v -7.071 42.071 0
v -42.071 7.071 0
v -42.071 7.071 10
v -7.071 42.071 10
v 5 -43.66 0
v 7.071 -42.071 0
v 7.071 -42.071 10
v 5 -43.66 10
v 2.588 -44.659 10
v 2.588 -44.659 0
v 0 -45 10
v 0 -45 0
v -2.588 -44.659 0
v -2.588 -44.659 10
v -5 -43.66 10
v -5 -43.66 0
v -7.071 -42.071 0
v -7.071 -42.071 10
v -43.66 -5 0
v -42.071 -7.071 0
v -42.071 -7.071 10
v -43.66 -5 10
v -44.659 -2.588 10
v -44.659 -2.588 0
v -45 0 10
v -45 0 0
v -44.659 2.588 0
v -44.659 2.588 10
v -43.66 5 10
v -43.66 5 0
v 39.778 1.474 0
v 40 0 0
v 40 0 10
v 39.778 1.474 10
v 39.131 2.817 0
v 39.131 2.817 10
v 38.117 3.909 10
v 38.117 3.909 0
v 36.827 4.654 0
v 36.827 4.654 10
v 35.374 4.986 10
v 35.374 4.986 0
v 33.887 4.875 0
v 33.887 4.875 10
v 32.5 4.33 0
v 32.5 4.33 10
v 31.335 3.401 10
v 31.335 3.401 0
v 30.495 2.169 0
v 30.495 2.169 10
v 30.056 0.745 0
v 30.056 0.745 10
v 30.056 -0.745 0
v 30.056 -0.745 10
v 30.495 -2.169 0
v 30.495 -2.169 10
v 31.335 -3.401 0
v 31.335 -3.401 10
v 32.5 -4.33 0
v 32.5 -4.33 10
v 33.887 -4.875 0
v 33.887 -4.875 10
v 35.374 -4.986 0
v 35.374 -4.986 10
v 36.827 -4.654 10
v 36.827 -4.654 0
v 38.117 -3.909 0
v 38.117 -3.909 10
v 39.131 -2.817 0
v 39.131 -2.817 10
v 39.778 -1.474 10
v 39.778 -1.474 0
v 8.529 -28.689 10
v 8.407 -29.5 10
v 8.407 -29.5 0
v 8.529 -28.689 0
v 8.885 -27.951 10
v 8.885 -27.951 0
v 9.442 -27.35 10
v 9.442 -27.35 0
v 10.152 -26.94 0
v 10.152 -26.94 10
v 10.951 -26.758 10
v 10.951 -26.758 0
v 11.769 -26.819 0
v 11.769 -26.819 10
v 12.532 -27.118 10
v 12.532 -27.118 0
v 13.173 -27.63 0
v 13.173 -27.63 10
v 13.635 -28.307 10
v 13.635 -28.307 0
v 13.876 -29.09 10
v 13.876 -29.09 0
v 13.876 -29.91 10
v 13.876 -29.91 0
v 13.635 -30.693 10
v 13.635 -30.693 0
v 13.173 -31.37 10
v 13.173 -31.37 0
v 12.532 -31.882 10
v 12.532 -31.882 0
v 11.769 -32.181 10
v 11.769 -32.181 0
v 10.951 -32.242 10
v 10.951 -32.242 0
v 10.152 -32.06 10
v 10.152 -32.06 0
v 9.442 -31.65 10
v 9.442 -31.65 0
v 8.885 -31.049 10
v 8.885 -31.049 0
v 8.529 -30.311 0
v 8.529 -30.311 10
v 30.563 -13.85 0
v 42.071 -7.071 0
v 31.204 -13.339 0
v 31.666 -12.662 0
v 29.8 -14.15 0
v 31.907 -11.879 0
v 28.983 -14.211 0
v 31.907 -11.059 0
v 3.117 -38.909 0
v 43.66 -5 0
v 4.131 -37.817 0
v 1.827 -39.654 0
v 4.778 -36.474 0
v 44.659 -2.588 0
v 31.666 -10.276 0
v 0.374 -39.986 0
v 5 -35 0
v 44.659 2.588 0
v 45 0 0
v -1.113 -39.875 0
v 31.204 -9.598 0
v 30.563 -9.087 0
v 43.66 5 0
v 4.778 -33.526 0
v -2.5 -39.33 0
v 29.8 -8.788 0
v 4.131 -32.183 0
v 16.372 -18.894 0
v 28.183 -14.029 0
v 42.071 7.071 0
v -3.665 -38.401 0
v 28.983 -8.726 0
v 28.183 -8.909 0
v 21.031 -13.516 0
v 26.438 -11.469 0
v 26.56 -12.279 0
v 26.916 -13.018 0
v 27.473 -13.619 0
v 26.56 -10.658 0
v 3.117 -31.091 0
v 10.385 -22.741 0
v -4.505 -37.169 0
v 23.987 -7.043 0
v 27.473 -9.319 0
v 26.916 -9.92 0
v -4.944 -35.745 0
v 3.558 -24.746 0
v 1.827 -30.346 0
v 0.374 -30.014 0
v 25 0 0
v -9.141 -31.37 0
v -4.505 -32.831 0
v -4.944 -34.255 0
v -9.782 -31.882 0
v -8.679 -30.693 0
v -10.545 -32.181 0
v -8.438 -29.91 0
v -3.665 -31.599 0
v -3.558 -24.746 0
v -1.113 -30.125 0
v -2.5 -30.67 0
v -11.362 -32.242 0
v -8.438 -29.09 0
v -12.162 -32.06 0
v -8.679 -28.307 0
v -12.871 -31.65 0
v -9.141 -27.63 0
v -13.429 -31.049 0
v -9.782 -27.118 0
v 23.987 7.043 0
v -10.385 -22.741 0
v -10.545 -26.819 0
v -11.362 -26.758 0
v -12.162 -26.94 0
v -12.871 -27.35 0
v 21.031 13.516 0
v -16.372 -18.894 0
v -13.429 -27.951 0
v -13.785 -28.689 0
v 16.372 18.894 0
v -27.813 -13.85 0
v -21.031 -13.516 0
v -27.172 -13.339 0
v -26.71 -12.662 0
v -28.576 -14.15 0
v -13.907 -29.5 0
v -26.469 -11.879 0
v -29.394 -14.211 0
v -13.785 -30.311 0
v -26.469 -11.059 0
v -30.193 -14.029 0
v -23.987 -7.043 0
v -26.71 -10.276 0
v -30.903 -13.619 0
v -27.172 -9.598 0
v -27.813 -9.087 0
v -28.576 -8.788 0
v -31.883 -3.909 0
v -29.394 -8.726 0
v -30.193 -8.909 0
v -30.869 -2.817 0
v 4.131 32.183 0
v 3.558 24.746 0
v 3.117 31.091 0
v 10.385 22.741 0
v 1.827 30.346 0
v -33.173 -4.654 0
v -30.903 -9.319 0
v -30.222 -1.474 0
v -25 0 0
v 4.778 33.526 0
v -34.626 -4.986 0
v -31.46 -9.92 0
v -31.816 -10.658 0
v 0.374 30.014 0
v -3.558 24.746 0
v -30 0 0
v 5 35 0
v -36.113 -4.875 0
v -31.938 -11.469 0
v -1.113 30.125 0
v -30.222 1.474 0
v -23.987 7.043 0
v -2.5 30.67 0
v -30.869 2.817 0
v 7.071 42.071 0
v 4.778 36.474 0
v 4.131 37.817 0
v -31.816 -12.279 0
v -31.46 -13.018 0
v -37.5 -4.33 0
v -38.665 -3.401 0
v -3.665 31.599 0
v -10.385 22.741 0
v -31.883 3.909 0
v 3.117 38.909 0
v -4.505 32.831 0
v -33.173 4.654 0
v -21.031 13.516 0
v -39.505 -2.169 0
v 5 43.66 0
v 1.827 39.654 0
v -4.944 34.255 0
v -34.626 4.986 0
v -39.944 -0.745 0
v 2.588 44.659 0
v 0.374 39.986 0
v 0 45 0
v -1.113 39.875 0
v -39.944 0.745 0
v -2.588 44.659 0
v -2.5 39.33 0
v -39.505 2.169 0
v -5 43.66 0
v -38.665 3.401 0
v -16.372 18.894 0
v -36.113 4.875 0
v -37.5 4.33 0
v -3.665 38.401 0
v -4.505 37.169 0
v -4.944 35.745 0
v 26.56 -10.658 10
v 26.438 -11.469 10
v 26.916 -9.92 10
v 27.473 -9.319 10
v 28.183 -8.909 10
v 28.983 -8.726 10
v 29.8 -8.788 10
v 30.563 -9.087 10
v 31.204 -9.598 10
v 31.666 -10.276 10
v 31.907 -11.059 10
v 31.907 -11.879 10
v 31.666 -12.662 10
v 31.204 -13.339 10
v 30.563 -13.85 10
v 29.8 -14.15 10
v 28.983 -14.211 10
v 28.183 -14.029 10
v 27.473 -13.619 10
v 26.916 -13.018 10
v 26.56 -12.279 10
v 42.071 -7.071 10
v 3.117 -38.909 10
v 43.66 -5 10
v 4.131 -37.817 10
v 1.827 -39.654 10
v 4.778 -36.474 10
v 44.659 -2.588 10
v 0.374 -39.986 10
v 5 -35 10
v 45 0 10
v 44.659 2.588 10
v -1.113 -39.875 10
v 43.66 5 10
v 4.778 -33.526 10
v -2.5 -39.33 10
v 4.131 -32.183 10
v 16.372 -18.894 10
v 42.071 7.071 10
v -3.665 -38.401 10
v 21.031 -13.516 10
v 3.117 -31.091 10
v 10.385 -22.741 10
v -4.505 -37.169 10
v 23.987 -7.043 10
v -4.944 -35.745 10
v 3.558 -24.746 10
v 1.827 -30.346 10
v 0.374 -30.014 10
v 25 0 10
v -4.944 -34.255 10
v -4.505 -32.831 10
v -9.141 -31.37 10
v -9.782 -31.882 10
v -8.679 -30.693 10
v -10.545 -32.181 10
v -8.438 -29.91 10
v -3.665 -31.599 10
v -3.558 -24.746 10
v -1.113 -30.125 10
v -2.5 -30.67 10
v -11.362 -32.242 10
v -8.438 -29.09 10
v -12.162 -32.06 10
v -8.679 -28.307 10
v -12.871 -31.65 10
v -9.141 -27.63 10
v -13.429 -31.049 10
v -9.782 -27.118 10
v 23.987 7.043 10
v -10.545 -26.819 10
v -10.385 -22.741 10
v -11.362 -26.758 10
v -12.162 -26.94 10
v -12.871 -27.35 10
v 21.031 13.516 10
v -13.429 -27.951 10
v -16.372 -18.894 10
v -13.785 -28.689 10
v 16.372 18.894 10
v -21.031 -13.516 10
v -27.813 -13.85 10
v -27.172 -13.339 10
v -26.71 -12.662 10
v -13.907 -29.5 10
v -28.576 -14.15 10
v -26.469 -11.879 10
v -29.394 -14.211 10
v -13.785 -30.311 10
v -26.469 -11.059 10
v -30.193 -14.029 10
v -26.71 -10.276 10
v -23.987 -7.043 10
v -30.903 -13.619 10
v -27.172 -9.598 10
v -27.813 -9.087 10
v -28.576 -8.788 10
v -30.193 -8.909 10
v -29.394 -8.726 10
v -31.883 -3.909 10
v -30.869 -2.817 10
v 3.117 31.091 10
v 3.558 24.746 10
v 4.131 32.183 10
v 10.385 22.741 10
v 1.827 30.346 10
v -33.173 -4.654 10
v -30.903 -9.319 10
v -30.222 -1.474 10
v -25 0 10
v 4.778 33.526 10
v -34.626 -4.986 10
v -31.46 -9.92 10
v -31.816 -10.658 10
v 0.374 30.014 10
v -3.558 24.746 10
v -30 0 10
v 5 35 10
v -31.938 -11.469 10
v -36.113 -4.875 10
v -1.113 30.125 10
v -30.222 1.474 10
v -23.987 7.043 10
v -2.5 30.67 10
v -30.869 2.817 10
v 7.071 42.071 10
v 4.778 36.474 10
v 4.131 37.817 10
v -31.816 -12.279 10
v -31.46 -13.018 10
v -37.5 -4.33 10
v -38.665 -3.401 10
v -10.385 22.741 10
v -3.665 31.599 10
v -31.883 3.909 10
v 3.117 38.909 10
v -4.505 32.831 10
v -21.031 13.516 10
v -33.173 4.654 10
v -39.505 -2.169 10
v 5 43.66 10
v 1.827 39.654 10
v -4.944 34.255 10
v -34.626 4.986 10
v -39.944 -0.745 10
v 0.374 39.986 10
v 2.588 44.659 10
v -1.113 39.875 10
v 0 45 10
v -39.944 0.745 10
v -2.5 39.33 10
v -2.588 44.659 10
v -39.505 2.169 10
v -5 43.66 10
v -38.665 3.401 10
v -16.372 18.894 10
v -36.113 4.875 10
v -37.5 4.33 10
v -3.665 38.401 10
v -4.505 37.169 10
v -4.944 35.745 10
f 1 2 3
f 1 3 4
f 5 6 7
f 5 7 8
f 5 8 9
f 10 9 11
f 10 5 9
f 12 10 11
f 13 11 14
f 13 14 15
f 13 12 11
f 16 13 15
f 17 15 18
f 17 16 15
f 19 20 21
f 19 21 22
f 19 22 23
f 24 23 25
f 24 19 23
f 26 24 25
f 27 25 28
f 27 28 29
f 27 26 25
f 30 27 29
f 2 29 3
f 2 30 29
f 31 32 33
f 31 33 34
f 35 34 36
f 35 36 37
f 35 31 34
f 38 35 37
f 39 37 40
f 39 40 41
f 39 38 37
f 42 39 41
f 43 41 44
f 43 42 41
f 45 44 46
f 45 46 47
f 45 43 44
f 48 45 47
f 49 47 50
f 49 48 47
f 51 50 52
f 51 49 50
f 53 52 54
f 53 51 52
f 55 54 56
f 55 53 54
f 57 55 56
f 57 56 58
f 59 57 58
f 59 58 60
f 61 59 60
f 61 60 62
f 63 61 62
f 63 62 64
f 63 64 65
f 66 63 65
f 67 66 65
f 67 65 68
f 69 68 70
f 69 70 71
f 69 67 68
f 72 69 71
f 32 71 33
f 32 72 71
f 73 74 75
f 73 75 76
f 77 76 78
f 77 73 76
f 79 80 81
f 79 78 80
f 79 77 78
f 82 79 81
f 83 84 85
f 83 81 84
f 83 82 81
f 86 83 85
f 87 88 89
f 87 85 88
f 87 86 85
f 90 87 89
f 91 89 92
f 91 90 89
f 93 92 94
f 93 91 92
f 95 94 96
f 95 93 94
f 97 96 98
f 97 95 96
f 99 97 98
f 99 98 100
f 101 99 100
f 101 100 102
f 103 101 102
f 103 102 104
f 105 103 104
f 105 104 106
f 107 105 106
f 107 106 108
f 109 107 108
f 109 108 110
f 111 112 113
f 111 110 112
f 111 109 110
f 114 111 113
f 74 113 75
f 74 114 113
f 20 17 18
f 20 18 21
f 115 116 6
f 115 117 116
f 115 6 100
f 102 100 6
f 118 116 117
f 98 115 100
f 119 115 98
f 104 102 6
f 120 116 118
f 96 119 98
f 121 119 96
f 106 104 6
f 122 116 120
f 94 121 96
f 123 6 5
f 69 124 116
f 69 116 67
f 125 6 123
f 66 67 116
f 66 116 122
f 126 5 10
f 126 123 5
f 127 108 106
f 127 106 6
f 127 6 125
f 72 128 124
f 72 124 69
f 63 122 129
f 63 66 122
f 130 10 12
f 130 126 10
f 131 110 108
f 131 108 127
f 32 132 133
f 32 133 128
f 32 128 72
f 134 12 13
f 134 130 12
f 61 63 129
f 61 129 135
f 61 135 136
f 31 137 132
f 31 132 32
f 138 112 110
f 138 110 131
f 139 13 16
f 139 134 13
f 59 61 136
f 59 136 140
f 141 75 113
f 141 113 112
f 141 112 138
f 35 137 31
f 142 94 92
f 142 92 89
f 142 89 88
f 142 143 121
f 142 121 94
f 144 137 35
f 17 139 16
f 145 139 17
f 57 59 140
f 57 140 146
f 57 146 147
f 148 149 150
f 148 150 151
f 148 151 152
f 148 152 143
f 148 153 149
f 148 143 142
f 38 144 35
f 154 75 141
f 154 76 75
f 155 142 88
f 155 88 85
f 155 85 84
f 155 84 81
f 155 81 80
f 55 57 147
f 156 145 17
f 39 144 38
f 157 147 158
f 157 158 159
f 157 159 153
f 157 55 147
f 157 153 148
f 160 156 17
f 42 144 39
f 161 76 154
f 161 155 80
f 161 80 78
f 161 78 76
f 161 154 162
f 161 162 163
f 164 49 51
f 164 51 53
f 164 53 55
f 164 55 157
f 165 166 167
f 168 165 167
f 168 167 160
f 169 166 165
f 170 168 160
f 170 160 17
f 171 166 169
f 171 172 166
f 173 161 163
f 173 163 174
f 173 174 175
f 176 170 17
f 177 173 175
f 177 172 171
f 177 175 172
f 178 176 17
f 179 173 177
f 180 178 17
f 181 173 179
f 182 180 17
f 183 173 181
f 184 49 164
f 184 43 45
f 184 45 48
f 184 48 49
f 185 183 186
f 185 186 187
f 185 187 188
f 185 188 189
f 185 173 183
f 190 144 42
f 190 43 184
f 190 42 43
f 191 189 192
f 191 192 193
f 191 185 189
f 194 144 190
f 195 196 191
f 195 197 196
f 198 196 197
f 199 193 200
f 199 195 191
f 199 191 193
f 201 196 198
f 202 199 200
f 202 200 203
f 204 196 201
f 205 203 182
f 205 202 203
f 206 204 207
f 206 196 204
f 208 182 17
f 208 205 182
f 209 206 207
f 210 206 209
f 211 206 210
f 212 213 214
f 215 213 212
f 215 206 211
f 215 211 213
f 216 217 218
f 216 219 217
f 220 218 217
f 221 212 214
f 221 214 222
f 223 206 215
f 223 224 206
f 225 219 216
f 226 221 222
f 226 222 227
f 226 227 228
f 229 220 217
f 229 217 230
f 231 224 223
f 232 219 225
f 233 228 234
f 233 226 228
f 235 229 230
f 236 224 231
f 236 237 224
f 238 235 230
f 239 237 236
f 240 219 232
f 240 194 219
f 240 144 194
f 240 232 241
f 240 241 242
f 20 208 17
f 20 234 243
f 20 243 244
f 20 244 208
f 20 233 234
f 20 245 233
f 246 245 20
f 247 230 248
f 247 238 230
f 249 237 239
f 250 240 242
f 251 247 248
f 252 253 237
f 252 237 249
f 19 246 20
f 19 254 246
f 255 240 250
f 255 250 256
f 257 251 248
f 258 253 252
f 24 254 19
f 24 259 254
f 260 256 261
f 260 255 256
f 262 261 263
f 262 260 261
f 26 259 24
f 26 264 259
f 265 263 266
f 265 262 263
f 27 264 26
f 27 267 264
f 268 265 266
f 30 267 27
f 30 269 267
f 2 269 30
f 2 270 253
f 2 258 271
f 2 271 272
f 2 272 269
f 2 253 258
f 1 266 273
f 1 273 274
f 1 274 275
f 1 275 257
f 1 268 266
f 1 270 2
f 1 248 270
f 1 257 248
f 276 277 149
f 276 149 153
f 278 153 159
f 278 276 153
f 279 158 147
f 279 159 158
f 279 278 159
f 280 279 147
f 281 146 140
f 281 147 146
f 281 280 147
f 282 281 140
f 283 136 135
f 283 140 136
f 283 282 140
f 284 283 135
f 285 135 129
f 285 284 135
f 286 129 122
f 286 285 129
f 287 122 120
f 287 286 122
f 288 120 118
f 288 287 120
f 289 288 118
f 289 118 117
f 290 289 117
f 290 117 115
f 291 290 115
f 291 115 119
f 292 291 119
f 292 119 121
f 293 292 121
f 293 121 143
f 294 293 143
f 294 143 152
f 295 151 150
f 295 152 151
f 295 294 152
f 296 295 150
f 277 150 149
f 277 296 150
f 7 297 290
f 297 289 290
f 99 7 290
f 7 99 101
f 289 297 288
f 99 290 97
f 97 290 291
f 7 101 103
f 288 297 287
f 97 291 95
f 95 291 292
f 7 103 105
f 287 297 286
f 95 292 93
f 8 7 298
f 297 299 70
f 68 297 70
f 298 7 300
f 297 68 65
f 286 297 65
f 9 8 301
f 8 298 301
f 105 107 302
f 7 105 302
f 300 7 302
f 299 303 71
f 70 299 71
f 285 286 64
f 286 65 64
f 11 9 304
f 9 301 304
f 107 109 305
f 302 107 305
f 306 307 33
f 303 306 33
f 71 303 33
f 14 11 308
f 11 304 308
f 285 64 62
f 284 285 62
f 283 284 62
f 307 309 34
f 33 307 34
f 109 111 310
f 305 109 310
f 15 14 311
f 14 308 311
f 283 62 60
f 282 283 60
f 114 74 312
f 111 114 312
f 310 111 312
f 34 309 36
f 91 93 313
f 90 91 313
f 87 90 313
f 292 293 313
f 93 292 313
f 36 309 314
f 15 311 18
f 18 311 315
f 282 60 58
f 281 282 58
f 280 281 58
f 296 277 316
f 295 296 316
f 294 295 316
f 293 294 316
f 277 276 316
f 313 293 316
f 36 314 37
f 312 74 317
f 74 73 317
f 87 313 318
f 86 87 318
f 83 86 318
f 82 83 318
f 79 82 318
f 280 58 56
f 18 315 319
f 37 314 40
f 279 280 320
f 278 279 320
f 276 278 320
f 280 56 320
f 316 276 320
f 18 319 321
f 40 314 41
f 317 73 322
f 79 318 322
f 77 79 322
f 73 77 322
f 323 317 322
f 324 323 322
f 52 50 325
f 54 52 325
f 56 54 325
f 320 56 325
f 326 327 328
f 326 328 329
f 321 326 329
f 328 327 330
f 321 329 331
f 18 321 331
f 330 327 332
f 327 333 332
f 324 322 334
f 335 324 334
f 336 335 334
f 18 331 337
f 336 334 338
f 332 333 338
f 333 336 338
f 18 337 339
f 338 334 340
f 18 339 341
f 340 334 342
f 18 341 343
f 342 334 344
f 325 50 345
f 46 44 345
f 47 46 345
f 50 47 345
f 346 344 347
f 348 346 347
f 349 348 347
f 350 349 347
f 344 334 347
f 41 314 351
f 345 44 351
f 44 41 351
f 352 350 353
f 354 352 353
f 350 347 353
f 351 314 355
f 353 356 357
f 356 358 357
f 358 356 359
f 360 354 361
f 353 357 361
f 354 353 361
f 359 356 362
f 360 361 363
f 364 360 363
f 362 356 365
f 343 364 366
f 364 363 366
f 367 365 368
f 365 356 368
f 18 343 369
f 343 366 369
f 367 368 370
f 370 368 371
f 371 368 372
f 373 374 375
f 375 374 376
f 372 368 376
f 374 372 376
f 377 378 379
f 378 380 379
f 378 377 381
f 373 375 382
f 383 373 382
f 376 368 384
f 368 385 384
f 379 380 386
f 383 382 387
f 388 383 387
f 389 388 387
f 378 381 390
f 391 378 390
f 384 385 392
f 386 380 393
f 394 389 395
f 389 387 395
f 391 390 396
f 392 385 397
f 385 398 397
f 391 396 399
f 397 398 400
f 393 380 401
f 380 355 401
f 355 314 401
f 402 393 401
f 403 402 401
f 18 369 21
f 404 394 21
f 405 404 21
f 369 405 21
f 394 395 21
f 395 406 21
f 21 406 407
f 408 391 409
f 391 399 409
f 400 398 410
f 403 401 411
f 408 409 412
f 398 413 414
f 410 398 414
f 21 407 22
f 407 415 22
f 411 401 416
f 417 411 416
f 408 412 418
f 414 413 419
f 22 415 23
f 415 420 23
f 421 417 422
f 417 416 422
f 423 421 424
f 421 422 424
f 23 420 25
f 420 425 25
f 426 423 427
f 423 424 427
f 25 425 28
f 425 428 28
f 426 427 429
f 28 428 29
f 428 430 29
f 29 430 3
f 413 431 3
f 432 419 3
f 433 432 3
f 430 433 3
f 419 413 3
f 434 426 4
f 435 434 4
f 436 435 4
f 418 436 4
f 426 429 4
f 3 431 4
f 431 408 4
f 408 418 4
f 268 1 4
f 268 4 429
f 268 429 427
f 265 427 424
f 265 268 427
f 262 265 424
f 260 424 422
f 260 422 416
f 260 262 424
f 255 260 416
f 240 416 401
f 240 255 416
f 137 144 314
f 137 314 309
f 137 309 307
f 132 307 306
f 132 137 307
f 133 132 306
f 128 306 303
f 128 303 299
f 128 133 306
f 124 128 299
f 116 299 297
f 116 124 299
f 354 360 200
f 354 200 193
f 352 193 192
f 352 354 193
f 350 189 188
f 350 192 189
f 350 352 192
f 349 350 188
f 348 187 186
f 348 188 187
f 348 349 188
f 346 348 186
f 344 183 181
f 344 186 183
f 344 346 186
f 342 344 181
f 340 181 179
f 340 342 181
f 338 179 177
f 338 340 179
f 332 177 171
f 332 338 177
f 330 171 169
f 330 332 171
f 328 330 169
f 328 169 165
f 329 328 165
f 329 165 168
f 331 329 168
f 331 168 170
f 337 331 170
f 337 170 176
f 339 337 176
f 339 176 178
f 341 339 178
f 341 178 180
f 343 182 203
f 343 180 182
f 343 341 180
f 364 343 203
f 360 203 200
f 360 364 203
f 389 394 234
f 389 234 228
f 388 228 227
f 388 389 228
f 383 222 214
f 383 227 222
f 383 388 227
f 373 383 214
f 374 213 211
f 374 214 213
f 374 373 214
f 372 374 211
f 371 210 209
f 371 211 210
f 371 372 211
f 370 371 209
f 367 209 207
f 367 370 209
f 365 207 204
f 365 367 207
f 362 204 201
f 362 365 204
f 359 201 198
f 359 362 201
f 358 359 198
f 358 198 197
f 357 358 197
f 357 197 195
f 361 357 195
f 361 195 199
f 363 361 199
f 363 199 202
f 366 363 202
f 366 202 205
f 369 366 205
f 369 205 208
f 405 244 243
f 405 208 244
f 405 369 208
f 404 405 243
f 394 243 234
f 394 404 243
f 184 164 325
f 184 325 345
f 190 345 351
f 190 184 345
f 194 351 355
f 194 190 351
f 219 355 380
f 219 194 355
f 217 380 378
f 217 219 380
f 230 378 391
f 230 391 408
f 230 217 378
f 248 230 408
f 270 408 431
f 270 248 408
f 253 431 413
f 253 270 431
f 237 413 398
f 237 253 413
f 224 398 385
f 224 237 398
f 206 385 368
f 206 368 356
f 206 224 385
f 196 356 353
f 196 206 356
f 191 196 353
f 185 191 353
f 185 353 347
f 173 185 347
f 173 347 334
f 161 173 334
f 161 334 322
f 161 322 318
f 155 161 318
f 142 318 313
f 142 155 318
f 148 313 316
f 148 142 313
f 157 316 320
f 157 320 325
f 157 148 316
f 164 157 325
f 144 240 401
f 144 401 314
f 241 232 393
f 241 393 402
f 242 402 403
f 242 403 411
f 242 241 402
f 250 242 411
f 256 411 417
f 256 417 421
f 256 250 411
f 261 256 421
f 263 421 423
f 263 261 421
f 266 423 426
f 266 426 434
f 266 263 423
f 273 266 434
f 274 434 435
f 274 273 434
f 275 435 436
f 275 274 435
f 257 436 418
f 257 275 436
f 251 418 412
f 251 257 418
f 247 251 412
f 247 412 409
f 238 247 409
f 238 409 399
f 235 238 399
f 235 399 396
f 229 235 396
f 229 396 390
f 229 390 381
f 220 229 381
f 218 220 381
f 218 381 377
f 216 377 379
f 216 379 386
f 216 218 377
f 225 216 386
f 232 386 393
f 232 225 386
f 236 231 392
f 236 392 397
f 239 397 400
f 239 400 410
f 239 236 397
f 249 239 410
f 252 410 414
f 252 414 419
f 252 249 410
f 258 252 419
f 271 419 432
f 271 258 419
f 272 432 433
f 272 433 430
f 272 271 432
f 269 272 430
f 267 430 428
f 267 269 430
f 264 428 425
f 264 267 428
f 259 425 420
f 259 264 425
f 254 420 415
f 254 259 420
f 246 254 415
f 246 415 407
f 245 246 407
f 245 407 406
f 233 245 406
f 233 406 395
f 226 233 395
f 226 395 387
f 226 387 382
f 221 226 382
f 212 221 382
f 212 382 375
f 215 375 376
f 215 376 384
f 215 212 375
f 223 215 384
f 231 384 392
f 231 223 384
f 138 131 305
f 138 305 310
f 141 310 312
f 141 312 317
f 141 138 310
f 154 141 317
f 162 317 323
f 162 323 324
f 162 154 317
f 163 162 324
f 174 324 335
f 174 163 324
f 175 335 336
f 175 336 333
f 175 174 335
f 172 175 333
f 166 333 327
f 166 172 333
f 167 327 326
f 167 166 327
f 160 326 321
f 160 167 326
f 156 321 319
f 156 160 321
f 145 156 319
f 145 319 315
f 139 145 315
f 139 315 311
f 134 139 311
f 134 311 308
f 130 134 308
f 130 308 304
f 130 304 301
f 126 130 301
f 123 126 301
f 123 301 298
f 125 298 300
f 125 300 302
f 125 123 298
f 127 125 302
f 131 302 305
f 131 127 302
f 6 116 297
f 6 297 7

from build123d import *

# Parameters (mm, degrees)
SZKIC1_R                        = 5
SZKIC1_R_2                      = 25
DODANIE_WYCI_GNI_CIE1_DEPTH     = 10
WYTNIJ_WYCI_GNI_CIE1_DEPTH      = 65.420493634
WYTNIJ_WYCI_GNI_CIE1_DEPTH_BACK = 65.420493634
SZKIC2_R                        = 2.75


with BuildPart() as part:
    # Szkic1 → Dodanie-wyciągnięcie1 (new body)
    with BuildSketch(Plane.XY):
        with BuildLine():
            Line((-42.071067812, 7.071067812), (-7.071067812, 42.071067812))
            ThreePointArc((-7.071067812, 42.071067812), (0, 45), (7.071067812, 42.071067812))
            Line((7.071067812, 42.071067812), (42.071067812, 7.071067812))
            ThreePointArc((42.071067812, 7.071067812), (45, 0), (42.071067812, -7.071067812))
            Line((42.071067812, -7.071067812), (7.071067812, -42.071067812))
            ThreePointArc((7.071067812, -42.071067812), (0, -45), (-7.071067812, -42.071067812))
            Line((-7.071067812, -42.071067812), (-42.071067812, -7.071067812))
            ThreePointArc((-42.071067812, -7.071067812), (-45, 0), (-42.071067812, 7.071067812))
        make_face()
        with Locations((-35, 0)):
            Circle(SZKIC1_R, mode=Mode.SUBTRACT)
        with Locations((0, 35)):
            Circle(SZKIC1_R, mode=Mode.SUBTRACT)
        with Locations((35, 0)):
            Circle(SZKIC1_R, mode=Mode.SUBTRACT)
        with Locations((0, -35)):
            Circle(SZKIC1_R, mode=Mode.SUBTRACT)
        Circle(SZKIC1_R_2, mode=Mode.SUBTRACT)
    extrude(amount=DODANIE_WYCI_GNI_CIE1_DEPTH)

    # Szkic2 → Wytnij-wyciągnięcie1 (cut, two sides: drawn at the far end of the back side and taken through both)
    with BuildSketch(Plane(origin=(0, 0, 0), x_dir=(-1, 0, 0), z_dir=(0, 0, -1)).offset(-WYTNIJ_WYCI_GNI_CIE1_DEPTH_BACK)):
        with Locations((11.156854249, -29.5)):
            Circle(SZKIC2_R)
        with Locations((29.18807717, -11.46877708)):
            Circle(SZKIC2_R)
        with Locations((-11.156854249, -29.5)):
            Circle(SZKIC2_R)
        with Locations((-29.18807717, -11.46877708)):
            Circle(SZKIC2_R)
    extrude(amount=WYTNIJ_WYCI_GNI_CIE1_DEPTH + WYTNIJ_WYCI_GNI_CIE1_DEPTH_BACK, mode=Mode.SUBTRACT)


solid = part.part
